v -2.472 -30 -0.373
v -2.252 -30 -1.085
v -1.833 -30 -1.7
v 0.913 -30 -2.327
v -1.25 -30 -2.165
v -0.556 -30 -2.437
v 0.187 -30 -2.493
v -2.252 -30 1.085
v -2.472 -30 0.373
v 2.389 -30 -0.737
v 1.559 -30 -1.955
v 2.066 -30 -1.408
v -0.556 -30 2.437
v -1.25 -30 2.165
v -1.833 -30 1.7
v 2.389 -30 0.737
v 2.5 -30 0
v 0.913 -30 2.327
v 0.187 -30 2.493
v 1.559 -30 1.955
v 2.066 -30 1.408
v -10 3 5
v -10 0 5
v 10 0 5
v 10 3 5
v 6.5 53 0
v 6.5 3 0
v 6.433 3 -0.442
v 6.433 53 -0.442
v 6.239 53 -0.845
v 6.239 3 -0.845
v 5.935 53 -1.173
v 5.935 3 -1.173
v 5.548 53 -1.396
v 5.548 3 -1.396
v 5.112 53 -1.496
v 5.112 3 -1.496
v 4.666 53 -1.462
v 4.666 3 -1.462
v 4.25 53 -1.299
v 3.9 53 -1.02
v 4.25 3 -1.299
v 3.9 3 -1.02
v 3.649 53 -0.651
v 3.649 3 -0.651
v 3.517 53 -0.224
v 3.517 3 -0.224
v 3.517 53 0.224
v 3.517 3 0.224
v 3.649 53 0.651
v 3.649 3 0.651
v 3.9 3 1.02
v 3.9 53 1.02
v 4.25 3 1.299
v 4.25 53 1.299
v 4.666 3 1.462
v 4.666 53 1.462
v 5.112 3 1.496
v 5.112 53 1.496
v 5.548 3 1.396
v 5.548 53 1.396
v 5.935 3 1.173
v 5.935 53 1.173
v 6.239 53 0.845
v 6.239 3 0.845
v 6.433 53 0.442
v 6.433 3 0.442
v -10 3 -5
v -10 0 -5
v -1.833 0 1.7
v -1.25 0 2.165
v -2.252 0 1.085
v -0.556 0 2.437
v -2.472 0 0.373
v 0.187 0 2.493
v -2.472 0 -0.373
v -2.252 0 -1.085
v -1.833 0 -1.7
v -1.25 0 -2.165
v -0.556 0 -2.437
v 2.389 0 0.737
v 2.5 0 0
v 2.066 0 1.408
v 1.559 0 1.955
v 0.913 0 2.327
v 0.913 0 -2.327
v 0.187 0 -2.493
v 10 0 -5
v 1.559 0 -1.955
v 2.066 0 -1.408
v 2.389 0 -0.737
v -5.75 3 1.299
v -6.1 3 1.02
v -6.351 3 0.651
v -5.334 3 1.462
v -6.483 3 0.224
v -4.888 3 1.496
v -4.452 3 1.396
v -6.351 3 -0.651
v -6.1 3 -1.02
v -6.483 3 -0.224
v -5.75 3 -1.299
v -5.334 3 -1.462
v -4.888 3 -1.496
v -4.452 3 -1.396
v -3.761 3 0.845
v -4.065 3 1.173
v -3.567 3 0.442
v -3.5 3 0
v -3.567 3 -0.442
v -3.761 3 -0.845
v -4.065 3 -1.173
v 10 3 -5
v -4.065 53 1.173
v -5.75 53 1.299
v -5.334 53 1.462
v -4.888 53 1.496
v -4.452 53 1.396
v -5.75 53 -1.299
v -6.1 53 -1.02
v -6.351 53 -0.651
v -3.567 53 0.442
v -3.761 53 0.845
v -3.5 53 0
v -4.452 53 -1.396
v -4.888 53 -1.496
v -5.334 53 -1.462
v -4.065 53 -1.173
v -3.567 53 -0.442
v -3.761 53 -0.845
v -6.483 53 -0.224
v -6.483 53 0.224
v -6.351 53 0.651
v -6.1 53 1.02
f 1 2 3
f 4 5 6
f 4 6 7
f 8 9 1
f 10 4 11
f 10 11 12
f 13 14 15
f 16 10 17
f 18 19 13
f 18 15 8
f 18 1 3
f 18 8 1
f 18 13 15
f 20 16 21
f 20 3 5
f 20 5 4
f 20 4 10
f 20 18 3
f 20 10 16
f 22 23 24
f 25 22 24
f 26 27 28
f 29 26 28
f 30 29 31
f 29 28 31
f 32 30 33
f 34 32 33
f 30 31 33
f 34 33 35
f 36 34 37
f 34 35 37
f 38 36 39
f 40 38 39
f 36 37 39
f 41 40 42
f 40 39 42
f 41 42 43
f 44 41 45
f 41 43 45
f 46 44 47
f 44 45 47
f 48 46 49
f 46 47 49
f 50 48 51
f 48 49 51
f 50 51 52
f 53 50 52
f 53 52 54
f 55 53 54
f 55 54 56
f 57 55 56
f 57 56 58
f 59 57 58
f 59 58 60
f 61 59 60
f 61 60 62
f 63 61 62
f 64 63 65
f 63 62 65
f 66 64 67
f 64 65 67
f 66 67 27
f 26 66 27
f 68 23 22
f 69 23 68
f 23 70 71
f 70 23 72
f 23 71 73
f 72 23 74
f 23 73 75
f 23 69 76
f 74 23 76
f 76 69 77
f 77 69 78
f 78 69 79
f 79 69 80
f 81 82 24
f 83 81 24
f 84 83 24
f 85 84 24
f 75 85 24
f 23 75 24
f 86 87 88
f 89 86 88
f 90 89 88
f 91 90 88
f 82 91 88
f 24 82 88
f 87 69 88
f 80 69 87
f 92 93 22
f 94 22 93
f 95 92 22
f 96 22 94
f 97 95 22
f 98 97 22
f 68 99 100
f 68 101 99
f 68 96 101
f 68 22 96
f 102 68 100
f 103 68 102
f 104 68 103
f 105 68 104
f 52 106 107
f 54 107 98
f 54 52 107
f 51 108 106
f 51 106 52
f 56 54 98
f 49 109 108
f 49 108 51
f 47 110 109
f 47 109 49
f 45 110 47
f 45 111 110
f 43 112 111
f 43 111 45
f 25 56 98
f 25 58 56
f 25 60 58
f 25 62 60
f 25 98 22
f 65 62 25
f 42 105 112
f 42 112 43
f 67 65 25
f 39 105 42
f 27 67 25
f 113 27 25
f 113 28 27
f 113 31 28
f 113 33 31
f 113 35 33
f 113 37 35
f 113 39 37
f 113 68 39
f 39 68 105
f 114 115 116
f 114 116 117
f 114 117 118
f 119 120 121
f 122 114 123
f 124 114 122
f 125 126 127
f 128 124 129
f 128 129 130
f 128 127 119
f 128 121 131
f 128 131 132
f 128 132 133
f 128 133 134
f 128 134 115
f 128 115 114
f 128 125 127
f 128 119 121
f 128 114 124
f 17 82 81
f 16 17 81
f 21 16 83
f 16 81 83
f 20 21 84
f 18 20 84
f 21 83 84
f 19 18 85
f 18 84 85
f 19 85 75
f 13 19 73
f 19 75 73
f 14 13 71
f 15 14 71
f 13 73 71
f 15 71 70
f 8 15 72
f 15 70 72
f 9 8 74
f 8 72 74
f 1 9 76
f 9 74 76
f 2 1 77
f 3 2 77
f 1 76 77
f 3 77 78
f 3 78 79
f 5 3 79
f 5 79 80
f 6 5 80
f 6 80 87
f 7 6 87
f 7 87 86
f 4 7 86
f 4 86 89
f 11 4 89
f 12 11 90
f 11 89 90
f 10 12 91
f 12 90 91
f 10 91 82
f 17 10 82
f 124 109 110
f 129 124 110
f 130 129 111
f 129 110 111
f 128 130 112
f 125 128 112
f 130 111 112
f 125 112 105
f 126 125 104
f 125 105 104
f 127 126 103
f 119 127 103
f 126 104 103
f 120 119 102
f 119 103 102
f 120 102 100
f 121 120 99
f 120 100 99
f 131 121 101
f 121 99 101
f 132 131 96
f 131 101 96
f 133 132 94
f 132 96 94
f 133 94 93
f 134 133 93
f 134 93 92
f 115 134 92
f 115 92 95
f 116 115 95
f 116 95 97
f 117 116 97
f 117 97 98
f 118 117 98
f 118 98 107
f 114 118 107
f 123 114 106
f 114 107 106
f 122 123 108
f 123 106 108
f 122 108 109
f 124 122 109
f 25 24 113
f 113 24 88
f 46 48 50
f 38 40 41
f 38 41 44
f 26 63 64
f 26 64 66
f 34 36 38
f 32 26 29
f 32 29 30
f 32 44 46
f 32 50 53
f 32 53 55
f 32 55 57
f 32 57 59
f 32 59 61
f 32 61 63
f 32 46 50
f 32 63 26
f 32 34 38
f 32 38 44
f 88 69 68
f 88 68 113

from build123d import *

# Parameters (mm, degrees)
SKETCH1_W           = 20
SKETCH1_H           = 10
BOSS_EXTRUDE1_DEPTH = 3
SKETCH2_R           = 1.5
BOSS_EXTRUDE2_DEPTH = 50
SKETCH3_R           = 2.5
BOSS_EXTRUDE3_DEPTH = 30


with BuildPart() as part:
    # Sketch1 → Boss-Extrude1 (new body)
    with BuildSketch(Plane(origin=(0, 0, 0), x_dir=(1, 0, 0), z_dir=(0, 1, 0))):
        Rectangle(SKETCH1_W, SKETCH1_H)
    extrude(amount=BOSS_EXTRUDE1_DEPTH)

    # Sketch2 → Boss-Extrude2 (add)
    with BuildSketch(Plane(origin=(0, 3, 0), x_dir=(1, 0, 0), z_dir=(0, 1, 0))):
        with Locations((-5, 0)):
            Circle(SKETCH2_R)
        with Locations((5, 0)):
            Circle(SKETCH2_R)
    extrude(amount=BOSS_EXTRUDE2_DEPTH)

    # Sketch3 → Boss-Extrude3 (add)
    with BuildSketch(Plane.XZ):
        Circle(SKETCH3_R)
    extrude(amount=BOSS_EXTRUDE3_DEPTH)


solid = part.part
